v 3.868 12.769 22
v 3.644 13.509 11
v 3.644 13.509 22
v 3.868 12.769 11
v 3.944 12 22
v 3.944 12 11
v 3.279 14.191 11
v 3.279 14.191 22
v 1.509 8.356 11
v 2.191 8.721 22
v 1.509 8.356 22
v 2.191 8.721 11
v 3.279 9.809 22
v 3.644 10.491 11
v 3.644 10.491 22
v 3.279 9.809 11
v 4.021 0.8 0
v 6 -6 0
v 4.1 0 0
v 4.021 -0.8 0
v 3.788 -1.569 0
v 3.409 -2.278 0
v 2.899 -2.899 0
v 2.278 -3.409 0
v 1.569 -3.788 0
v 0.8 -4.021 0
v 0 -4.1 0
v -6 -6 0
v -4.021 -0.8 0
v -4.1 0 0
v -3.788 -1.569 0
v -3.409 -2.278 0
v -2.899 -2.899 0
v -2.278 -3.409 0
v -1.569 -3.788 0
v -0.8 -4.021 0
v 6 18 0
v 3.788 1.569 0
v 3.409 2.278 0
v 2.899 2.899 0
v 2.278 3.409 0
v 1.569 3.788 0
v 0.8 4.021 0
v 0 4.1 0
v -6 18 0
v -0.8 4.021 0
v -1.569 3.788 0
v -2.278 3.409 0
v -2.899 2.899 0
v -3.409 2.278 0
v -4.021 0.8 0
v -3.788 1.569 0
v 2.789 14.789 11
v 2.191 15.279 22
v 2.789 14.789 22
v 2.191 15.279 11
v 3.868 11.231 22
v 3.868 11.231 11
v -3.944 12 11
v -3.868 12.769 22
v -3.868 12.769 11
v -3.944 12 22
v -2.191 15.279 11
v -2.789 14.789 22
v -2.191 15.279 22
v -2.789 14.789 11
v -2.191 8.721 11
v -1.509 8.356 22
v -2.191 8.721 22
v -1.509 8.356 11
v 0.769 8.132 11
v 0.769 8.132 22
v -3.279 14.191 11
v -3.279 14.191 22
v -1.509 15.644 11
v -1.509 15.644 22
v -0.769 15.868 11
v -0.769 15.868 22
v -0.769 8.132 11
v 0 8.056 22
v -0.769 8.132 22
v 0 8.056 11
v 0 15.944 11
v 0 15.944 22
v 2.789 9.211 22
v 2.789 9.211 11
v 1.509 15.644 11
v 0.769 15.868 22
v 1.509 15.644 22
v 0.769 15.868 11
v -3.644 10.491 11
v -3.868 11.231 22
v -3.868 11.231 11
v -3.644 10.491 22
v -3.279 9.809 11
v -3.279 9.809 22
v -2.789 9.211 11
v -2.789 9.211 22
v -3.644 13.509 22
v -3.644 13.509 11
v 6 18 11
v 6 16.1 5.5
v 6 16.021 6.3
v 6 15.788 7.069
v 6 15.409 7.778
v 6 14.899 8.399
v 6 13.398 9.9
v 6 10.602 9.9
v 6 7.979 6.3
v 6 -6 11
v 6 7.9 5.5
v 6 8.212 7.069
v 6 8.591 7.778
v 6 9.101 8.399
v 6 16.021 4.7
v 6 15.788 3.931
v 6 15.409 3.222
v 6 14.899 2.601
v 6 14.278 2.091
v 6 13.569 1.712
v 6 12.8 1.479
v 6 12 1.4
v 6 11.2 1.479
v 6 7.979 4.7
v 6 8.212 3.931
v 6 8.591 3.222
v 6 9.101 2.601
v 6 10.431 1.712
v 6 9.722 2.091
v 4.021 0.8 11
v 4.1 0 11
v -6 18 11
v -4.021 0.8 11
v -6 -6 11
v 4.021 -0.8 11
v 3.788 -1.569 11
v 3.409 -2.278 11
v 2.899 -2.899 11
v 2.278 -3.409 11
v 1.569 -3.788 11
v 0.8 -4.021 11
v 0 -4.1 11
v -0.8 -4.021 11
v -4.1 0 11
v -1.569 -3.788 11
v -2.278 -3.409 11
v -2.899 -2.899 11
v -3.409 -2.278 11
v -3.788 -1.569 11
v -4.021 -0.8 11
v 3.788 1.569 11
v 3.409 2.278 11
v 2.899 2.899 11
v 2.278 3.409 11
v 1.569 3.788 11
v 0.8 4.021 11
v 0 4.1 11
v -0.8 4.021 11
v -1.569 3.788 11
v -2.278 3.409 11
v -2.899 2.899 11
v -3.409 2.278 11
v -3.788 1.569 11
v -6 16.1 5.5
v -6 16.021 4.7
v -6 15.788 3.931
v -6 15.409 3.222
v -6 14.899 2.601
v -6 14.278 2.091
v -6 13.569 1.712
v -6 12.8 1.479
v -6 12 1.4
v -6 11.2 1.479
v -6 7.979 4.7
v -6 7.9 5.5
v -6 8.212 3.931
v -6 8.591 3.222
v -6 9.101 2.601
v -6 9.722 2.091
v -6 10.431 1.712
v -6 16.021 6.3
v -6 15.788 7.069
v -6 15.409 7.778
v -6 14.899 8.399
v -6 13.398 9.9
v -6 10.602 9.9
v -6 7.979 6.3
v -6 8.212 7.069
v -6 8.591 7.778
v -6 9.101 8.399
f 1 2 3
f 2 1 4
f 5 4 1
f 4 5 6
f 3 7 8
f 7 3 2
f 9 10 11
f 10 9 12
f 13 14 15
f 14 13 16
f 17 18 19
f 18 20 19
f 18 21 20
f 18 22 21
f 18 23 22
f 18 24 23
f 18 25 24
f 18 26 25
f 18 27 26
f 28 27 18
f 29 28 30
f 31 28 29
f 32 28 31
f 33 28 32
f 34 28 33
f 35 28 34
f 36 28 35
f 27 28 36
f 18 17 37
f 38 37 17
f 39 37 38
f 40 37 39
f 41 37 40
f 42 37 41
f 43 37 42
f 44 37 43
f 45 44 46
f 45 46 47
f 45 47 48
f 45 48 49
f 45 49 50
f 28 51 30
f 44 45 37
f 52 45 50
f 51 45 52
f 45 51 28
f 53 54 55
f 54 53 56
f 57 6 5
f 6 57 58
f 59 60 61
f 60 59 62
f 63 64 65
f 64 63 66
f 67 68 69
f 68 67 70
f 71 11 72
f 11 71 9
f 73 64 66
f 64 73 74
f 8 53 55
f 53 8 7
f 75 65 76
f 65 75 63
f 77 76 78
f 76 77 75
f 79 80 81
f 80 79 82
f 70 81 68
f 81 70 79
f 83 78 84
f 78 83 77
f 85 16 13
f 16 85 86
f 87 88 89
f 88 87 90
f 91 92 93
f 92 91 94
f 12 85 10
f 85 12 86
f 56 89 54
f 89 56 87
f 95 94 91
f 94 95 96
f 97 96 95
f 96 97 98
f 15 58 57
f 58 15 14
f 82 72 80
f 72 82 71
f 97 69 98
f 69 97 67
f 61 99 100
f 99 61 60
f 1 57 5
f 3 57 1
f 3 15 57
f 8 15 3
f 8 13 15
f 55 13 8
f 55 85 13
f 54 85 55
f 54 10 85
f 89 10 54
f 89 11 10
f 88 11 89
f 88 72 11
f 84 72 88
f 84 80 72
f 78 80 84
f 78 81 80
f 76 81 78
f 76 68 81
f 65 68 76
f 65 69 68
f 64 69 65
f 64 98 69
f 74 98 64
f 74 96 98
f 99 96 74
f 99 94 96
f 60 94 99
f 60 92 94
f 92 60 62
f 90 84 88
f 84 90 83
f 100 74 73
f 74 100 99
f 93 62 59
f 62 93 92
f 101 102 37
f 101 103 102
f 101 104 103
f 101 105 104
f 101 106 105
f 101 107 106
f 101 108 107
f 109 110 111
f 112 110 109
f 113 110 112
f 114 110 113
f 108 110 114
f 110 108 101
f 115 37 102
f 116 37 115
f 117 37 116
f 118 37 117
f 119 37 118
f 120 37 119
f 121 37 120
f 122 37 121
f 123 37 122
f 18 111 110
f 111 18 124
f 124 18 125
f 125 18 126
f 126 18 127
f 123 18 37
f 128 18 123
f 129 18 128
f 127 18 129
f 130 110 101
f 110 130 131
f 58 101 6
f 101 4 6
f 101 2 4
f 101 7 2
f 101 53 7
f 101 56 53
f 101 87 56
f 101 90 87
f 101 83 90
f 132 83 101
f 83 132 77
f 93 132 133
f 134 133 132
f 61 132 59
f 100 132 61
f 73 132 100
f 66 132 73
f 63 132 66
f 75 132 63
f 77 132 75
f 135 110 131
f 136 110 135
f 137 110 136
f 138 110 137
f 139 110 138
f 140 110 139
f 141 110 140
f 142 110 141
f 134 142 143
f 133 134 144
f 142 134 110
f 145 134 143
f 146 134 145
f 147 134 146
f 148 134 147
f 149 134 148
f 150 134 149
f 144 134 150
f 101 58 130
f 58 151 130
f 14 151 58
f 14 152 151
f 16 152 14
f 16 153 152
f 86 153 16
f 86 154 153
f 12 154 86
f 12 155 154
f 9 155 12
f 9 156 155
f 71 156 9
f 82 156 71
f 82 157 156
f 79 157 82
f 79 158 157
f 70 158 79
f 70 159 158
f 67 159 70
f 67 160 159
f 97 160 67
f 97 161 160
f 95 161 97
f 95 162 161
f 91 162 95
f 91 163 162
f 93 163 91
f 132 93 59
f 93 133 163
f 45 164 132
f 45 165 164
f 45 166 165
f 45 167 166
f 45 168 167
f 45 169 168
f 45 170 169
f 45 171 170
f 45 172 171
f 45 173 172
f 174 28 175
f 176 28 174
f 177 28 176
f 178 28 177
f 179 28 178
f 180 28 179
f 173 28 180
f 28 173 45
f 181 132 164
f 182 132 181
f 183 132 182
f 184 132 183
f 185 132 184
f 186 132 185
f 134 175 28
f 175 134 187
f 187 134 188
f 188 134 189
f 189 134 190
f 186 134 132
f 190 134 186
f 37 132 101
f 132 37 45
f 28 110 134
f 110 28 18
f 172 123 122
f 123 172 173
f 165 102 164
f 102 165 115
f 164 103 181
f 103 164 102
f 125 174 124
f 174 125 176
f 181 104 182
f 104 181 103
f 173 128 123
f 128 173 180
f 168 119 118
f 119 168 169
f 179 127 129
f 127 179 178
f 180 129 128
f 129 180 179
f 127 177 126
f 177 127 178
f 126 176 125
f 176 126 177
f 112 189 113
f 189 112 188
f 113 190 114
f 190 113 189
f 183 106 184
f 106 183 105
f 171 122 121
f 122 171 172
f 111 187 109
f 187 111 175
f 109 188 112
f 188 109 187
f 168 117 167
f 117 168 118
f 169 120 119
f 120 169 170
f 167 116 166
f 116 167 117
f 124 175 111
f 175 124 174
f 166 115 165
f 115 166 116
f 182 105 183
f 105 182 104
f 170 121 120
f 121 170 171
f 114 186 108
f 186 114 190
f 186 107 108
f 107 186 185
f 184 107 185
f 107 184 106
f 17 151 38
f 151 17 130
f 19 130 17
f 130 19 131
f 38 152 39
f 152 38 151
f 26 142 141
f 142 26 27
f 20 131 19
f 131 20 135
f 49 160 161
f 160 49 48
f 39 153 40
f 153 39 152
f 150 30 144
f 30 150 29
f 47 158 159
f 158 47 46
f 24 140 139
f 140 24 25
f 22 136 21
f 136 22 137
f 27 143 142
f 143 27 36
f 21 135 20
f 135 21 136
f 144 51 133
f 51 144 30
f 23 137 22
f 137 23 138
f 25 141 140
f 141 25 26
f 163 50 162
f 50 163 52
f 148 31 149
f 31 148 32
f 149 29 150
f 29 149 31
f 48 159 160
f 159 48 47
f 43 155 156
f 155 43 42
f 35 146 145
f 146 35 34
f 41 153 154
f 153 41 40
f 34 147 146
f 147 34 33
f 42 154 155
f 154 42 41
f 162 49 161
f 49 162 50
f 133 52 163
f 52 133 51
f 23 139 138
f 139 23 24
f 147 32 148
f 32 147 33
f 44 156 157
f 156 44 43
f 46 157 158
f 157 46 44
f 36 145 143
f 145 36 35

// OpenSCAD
// A correct 8mm test for fiting bearing and rods

wall = 4;
ll = 11;
xx = 12;

$fn=32;

shaft = 7.888; //7.84828
hole = 8.1993; //8,15



difference() {
    union() {
        
        translate([0,xx,0]) cylinder(d=shaft, h=ll*2);
        translate([-xx/2,-xx/2,0]) cube([xx,xx*2,ll]);
        
    }
    translate([0,0,-1])  cylinder(d=hole, h=ll*2);
    //translate([-xx,xx,ll/2]) rotate([0,90,0]) cylinder(d=hole, h=ll*2);
    translate([-xx,xx,ll/2]) flatteardrop(radius=hole/2, length=100, angle=90, luck=0.3);
    
}
//translate([-xx,xx,ll/2]) rotate([0,90,0]) cylinder(d=hole, h=ll*2);

module flatteardrop(radius=5, length=10, angle=90, luck=0) {
	//$fn=resolution(radius);

	sx1 = radius * sin(-45);
	sx2 = radius * -sin(-45);
	sy = radius * -cos(-45);
	ex = 0;
	ey = (sin(-135) + cos(-135)) * radius;

	dx= ex-sx1;
	dy = ey-sy;

	eys = -radius-luck;
	dys = eys-sy;
	ex1 = sy+dys*dx/dy;
	ex2 = -ex1;

	rotate([0, angle, 0]) union() {
		linear_extrude(height = length, center = true, convexity = radius, twist = 0)
			circle(r = radius);
		linear_extrude(height = length, center = true, convexity = radius, twist = 0)
			polygon(points = [
				[sy, sx1],
				[sy, sx2],
				[eys, ex2],
				[eys, ex1]],
				paths = [[0, 1, 2, 3]]);
	}
}
